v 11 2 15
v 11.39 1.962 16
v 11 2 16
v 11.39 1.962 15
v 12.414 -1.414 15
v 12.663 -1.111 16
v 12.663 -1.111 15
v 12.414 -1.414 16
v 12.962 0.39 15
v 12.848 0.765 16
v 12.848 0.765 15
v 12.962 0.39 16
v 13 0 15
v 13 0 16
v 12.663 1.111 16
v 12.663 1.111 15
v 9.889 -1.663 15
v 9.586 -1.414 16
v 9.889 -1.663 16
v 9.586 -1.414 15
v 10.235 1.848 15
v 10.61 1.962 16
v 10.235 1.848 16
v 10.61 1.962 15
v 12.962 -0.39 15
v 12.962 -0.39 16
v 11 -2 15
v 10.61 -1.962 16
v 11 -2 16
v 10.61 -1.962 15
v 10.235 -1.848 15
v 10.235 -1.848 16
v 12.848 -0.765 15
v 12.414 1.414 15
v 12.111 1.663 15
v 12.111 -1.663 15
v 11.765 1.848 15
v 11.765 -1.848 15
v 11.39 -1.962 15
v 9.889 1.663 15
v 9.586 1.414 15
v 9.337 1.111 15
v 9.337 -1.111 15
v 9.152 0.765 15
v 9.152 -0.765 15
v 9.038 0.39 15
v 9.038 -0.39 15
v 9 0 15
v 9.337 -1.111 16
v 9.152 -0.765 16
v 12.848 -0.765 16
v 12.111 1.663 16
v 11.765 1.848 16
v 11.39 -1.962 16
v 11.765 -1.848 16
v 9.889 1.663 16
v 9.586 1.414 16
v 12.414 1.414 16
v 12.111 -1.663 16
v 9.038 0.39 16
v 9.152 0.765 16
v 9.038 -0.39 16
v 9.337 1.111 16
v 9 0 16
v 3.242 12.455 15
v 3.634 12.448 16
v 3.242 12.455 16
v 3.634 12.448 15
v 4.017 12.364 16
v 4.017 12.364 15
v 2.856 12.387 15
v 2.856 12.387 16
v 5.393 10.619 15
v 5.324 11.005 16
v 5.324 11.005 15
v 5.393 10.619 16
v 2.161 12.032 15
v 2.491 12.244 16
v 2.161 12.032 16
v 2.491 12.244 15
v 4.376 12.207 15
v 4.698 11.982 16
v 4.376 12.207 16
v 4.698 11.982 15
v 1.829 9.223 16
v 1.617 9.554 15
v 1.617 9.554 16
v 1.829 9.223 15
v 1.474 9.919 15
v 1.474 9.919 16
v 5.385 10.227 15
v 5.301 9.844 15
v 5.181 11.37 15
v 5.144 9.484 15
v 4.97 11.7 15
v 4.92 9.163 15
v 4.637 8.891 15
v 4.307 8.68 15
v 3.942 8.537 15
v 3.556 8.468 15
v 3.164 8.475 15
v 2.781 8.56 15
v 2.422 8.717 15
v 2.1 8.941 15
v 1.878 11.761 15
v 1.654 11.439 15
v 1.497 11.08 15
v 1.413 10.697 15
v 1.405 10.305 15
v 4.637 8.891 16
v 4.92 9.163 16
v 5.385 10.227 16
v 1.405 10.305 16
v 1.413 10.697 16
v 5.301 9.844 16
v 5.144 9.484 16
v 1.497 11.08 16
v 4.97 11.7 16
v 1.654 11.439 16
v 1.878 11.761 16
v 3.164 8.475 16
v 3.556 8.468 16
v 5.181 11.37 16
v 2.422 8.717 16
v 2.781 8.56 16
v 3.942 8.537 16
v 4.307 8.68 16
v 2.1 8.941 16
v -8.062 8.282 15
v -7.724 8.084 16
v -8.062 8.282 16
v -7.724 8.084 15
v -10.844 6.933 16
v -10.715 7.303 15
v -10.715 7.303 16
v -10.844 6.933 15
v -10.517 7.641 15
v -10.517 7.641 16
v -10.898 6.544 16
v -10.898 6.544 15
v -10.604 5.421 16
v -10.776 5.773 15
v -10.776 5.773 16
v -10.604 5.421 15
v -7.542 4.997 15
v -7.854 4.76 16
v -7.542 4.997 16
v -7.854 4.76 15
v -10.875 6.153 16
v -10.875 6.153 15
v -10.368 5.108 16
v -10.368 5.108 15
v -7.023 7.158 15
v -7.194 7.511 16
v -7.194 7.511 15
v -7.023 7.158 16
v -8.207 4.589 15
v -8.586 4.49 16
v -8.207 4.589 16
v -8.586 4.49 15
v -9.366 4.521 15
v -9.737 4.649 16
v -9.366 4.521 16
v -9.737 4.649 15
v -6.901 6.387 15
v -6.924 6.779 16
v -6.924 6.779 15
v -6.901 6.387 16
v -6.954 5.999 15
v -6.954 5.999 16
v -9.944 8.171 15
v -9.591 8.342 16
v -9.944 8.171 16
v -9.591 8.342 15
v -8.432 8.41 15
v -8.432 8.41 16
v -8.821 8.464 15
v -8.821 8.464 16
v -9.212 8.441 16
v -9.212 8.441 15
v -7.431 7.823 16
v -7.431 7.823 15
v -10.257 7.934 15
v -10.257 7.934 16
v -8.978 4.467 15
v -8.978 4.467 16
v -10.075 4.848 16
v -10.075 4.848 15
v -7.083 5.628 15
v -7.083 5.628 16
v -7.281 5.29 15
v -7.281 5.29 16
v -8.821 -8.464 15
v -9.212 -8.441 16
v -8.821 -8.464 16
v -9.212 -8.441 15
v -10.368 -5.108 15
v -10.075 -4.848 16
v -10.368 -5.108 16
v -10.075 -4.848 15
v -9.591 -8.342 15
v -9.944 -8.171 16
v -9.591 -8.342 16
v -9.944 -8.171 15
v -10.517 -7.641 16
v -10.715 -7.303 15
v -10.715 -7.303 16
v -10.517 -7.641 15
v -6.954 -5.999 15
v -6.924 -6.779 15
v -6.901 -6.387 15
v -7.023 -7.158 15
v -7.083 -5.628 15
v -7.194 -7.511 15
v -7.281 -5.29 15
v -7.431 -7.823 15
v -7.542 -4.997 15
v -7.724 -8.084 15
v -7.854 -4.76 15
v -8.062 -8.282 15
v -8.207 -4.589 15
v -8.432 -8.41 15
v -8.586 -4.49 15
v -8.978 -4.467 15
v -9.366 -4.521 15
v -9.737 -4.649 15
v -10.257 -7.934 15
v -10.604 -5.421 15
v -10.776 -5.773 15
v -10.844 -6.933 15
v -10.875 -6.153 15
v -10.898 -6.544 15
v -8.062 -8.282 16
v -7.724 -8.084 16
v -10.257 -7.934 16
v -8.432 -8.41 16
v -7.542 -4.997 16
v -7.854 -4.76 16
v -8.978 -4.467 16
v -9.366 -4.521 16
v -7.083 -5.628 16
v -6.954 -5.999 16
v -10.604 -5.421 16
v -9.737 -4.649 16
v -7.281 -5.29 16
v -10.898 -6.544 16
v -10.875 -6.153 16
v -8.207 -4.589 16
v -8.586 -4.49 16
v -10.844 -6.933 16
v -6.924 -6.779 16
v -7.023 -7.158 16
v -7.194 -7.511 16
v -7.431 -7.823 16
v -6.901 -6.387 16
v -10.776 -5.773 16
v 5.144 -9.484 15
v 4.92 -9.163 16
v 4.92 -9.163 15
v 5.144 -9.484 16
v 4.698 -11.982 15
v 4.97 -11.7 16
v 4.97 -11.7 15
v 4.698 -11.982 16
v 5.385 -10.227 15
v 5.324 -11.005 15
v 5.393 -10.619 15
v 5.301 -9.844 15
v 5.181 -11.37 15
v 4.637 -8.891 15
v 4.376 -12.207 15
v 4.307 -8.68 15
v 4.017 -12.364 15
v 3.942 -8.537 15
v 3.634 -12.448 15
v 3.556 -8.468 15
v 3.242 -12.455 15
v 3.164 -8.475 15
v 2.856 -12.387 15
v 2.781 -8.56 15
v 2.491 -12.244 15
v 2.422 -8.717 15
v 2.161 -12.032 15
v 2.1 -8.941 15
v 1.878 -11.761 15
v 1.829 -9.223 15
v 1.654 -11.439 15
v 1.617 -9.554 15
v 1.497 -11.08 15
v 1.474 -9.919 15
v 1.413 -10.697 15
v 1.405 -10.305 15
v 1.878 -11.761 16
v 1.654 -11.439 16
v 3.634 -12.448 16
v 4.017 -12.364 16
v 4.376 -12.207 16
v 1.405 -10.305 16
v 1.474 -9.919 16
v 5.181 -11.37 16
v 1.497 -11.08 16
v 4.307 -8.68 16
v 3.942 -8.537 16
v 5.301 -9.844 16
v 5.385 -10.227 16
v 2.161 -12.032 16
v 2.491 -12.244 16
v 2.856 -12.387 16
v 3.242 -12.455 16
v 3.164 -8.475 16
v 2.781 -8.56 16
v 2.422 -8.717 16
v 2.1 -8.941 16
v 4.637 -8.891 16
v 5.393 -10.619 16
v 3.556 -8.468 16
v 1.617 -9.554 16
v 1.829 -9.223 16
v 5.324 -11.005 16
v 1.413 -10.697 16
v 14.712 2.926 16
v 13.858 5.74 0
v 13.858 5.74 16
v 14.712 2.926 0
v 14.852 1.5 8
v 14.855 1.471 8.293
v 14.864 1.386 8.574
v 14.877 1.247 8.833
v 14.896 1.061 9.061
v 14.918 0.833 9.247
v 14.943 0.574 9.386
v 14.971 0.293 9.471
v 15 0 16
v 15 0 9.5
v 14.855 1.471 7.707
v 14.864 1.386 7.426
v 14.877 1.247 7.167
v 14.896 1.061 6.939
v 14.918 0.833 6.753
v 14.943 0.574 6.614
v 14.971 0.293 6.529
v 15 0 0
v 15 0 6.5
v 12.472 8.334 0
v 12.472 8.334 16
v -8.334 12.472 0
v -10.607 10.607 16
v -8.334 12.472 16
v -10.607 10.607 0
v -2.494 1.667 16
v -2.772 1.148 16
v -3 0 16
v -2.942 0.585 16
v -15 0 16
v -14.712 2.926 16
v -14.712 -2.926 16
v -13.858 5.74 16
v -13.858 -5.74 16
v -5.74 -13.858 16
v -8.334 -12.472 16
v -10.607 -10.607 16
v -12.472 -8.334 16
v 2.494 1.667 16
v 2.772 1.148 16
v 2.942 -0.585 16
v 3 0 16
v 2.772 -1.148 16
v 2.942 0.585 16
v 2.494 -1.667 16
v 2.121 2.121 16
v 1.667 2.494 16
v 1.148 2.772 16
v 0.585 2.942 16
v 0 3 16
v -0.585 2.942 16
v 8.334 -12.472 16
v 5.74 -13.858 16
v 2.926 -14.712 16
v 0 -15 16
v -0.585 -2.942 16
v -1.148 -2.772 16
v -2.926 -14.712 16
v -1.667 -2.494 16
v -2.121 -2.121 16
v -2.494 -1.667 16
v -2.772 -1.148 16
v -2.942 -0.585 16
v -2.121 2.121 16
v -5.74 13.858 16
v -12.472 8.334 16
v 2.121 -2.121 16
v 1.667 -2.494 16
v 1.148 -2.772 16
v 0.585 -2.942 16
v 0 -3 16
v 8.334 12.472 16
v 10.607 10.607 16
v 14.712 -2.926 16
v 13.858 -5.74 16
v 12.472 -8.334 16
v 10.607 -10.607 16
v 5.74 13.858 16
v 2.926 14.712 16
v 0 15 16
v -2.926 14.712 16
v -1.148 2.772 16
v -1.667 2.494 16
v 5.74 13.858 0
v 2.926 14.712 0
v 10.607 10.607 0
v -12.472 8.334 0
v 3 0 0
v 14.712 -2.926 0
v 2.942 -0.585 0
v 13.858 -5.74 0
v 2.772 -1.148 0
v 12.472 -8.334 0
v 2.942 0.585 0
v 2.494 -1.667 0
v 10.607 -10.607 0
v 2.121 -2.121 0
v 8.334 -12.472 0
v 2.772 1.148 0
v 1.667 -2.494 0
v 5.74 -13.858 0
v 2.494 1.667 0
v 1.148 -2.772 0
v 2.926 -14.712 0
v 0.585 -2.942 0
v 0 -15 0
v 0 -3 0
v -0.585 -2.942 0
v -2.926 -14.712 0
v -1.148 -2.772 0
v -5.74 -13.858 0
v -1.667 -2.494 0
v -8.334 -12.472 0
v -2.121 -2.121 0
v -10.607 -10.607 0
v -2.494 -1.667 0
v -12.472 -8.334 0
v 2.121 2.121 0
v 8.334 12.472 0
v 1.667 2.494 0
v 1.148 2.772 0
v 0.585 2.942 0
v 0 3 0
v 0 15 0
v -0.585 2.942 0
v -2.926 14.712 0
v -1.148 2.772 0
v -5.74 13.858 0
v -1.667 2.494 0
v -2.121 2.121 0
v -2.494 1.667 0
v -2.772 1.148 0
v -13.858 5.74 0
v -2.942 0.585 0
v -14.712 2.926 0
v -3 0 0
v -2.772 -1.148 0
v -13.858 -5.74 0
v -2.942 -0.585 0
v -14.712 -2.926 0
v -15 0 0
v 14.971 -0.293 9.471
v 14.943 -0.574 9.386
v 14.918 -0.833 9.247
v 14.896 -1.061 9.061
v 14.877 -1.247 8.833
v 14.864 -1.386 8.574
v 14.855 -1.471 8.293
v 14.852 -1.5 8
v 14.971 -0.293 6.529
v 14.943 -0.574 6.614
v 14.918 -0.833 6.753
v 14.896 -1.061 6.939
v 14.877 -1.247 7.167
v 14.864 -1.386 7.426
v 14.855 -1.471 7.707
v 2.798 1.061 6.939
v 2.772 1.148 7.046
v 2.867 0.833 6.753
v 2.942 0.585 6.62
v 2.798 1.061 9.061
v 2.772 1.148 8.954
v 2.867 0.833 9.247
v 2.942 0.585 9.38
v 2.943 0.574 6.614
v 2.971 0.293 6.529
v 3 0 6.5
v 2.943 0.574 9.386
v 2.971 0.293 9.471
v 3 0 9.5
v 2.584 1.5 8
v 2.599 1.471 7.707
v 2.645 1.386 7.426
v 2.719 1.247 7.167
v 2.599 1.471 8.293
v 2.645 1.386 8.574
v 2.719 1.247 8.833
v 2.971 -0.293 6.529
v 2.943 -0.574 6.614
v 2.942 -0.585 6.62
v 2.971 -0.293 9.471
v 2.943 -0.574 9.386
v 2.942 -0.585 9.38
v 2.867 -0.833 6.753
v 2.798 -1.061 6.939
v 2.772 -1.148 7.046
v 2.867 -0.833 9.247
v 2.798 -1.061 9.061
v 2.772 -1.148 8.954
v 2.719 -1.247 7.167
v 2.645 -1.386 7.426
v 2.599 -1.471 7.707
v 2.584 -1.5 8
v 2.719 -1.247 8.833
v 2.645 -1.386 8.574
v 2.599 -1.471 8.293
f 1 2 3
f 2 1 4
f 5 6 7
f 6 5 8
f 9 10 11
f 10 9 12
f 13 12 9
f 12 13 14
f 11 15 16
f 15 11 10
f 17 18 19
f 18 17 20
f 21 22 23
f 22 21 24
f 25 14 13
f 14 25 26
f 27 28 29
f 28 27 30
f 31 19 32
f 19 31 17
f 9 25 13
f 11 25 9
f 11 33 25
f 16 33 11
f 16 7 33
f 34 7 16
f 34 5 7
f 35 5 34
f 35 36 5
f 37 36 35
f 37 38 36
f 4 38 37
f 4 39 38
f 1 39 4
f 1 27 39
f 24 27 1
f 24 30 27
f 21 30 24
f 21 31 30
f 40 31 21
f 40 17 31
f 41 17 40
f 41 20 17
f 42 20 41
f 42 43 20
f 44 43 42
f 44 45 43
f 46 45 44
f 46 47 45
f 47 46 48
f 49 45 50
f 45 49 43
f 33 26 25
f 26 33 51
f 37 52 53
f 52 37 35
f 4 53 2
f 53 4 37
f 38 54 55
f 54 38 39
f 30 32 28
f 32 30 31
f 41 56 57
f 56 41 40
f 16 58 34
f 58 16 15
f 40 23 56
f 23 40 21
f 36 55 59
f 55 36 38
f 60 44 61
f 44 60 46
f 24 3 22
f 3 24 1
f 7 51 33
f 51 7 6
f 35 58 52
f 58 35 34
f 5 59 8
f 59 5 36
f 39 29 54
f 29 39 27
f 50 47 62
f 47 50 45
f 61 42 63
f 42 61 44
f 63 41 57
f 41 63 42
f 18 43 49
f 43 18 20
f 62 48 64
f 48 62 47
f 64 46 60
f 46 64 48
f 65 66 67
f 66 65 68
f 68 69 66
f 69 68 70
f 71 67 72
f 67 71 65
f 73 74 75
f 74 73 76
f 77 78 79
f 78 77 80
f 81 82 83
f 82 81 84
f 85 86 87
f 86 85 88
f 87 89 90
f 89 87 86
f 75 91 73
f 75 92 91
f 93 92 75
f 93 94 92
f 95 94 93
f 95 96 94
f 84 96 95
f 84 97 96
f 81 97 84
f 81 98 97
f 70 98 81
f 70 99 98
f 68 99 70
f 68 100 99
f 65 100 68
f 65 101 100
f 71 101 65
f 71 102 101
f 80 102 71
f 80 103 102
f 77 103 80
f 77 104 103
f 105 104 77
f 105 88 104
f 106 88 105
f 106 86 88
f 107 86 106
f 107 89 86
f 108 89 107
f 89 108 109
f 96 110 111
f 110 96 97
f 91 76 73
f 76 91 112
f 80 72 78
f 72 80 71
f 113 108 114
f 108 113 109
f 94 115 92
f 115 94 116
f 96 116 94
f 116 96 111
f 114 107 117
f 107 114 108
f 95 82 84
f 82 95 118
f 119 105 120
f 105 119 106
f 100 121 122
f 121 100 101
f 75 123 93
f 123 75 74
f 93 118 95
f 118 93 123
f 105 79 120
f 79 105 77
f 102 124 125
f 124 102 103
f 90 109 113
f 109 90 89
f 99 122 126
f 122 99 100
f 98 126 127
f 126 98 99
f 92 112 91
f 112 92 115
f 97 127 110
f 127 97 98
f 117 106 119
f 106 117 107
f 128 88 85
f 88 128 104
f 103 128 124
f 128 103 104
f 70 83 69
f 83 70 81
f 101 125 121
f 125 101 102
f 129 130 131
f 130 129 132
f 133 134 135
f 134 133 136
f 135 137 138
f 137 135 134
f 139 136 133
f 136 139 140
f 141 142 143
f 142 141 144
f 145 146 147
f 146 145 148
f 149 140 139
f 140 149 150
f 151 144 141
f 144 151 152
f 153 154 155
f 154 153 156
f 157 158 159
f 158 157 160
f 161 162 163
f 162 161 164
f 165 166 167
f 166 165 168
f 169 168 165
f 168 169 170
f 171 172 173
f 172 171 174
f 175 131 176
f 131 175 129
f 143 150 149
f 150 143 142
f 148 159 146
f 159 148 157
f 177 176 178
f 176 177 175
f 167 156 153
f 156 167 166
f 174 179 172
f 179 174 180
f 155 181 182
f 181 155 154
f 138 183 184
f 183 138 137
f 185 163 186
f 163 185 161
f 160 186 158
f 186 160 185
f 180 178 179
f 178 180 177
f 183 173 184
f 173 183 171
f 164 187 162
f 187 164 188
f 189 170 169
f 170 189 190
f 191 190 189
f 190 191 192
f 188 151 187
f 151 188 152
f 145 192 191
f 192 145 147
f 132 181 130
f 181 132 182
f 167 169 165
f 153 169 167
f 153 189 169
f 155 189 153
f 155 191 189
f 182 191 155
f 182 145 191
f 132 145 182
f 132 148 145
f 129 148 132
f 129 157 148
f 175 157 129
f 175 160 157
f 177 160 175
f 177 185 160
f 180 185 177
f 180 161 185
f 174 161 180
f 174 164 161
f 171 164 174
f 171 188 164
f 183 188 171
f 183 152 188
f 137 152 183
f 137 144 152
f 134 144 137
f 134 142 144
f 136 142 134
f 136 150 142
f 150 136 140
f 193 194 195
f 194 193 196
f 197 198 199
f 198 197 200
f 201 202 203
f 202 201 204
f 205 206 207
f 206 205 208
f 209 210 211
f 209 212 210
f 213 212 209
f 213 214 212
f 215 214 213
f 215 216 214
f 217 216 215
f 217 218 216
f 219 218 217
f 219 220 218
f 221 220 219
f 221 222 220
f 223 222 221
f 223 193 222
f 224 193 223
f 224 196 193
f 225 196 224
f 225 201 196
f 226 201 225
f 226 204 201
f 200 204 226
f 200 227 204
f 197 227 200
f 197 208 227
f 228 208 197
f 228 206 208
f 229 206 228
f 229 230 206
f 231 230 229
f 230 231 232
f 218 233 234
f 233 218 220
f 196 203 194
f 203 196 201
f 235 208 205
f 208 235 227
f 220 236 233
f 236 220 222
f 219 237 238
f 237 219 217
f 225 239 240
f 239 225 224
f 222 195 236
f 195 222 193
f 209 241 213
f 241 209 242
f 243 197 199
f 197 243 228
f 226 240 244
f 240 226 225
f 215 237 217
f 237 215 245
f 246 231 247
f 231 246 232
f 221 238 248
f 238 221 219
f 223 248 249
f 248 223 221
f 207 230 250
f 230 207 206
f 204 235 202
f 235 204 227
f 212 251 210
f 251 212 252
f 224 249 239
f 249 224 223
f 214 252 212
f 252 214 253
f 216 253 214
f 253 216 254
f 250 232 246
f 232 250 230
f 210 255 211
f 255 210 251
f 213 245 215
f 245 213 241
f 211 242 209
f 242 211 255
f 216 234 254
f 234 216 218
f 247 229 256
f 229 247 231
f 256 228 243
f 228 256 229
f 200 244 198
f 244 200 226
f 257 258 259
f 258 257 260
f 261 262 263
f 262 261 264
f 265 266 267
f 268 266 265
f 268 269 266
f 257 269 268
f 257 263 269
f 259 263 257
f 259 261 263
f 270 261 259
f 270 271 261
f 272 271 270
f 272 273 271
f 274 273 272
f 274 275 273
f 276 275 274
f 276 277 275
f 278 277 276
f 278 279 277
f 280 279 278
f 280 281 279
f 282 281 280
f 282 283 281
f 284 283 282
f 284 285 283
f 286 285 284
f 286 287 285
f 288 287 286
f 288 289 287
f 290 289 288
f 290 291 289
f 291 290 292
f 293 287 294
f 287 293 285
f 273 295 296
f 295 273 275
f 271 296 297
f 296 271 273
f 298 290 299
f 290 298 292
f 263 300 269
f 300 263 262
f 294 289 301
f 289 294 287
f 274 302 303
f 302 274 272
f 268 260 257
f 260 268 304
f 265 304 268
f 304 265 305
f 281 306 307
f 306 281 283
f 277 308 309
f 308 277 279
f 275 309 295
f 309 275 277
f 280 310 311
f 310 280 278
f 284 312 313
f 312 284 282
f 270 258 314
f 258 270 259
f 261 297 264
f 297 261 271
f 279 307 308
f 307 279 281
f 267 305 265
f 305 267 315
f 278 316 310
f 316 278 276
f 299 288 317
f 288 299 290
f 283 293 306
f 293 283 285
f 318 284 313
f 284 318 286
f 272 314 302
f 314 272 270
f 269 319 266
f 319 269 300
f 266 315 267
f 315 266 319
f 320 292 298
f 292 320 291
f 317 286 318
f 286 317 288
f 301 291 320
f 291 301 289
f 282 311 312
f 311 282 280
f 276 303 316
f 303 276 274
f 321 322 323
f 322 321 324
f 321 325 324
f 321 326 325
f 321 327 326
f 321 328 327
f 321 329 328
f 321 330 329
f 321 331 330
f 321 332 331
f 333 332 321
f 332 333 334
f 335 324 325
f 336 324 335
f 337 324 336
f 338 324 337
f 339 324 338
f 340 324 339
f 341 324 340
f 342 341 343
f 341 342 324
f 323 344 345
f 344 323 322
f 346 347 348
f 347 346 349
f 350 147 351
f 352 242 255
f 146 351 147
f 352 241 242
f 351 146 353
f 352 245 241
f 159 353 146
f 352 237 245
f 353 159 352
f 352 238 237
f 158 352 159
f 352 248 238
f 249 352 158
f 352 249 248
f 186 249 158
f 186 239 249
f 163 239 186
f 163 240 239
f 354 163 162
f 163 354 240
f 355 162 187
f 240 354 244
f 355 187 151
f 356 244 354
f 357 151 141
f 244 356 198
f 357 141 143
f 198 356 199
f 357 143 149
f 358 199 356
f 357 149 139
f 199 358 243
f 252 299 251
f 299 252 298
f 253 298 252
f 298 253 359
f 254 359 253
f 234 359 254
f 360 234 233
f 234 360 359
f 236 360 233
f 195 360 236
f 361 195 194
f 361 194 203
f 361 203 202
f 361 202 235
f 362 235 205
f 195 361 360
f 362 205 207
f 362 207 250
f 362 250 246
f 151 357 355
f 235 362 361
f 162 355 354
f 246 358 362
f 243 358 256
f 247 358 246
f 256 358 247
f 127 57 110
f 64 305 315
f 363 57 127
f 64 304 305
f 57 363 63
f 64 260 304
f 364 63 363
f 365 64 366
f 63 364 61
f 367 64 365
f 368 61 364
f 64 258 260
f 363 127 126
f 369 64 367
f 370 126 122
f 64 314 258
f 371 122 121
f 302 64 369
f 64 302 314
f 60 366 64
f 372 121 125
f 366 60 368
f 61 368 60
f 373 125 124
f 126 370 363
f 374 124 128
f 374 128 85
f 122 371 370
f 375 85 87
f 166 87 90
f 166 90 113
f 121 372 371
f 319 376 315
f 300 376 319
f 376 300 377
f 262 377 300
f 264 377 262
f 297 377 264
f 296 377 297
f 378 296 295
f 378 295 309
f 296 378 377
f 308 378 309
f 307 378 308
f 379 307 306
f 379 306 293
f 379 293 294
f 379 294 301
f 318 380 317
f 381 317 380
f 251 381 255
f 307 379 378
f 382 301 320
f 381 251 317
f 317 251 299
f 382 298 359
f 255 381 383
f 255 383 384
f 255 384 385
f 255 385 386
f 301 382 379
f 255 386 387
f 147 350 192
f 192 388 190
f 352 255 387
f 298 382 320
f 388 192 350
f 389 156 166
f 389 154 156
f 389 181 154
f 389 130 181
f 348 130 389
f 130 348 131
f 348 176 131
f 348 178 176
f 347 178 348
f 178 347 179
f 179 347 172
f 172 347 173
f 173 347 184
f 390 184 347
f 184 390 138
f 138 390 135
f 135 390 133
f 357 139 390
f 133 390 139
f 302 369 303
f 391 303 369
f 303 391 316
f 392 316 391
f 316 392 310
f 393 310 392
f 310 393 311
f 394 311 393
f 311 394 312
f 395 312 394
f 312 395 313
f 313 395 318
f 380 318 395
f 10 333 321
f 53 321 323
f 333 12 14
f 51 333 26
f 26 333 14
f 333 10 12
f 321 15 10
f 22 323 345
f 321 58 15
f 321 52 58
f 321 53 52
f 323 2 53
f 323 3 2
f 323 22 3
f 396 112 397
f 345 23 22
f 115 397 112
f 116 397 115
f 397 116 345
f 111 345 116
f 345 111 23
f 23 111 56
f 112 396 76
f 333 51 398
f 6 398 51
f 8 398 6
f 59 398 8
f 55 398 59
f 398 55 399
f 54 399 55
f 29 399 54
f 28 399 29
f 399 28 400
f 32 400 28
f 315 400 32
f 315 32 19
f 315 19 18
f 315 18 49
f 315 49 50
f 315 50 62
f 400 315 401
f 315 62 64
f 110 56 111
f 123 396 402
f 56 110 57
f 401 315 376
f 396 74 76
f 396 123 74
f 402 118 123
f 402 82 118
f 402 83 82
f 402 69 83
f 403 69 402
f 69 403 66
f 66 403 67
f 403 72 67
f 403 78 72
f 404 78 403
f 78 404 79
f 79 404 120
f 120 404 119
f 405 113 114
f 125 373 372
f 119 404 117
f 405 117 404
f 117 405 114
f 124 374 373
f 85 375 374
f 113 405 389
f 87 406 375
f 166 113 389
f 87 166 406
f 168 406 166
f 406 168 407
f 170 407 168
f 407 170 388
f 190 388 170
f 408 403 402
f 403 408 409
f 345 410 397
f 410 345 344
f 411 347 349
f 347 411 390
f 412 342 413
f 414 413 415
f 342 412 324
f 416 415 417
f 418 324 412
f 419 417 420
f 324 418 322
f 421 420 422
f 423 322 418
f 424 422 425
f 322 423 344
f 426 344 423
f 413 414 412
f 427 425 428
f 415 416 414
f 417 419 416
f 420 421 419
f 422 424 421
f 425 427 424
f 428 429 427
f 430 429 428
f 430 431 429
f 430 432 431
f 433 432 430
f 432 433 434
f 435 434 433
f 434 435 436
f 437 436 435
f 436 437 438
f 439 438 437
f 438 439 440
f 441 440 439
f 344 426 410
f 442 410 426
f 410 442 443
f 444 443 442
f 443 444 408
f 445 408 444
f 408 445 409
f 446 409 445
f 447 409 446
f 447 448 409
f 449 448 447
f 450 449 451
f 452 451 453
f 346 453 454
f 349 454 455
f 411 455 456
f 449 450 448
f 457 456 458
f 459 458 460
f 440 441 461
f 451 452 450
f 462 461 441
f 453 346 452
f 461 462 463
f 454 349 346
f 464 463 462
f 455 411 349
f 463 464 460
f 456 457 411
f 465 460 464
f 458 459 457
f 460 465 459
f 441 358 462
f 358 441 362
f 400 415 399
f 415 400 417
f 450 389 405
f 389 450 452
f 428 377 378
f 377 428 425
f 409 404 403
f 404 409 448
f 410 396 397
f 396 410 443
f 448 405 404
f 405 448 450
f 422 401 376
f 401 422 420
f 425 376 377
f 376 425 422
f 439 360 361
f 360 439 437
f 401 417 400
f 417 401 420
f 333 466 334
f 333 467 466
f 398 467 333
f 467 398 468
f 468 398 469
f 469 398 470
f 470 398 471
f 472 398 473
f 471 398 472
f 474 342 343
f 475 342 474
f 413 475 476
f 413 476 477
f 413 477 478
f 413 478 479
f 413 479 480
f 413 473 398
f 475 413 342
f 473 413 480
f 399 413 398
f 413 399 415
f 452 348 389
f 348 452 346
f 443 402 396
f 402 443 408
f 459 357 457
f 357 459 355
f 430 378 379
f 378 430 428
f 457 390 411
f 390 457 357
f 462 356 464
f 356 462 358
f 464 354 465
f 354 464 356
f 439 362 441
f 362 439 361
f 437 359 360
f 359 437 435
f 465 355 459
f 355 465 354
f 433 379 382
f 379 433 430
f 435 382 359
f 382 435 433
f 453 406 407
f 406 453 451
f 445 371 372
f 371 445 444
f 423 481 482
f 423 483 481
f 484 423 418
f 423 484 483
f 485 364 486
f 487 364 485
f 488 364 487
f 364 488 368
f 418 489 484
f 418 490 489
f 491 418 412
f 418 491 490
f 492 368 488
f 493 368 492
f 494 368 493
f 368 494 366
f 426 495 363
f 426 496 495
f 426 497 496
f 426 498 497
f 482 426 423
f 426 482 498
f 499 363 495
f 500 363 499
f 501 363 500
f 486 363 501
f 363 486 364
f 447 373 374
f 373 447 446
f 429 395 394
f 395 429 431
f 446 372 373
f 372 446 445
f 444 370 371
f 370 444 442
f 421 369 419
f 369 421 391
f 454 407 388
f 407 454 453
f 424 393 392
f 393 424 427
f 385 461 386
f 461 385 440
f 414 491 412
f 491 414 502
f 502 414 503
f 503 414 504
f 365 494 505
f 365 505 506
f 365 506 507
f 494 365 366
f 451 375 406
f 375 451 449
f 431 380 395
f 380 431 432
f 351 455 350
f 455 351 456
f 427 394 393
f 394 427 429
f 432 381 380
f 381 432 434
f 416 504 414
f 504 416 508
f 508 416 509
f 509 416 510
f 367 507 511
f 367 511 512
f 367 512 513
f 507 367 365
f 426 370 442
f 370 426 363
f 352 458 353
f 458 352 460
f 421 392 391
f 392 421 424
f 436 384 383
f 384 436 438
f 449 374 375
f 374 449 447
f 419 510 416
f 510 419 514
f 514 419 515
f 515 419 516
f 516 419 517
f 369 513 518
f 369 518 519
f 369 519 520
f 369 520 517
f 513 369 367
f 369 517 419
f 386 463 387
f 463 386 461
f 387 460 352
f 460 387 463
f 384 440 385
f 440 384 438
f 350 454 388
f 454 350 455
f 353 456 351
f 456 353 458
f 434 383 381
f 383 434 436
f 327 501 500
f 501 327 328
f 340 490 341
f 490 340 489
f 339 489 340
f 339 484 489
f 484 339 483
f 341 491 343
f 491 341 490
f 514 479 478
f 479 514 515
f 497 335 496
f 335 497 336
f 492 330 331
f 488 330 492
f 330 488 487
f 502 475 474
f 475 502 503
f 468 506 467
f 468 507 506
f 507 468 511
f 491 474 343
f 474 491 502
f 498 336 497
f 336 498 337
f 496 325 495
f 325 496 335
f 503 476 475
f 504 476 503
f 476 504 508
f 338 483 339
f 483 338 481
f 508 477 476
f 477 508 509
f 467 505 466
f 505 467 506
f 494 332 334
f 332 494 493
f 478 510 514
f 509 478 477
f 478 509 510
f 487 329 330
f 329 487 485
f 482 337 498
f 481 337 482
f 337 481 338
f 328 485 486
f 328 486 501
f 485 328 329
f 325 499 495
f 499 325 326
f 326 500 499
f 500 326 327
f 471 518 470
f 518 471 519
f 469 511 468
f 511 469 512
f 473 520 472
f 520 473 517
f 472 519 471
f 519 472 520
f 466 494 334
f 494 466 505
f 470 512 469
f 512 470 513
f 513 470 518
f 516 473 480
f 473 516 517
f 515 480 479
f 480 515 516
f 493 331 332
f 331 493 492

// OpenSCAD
$fn = 32;

// ----------------------------------------------------------------------
// Control knob: dimpled knob
// ----------------------------------------------------------------------

// --- parameters (mm) ---
dimp_d = 4;               // finger dimple diameter
n_dimp = 5;               // number of dimples
dimp_r = 11;              // dimple ring radius
knob_d = 30;              // knob body diameter
knob_h = 16;              // knob body height
bore_d = 6;               // shaft bore diameter
set_d = 3;                // set screw bore diameter

dimp_step = 360 / n_dimp;  // dimple angular step

difference() {
  cylinder(h = knob_h, d = knob_d);
  translate([0, 0, -1]) cylinder(h = knob_h + 2, d = bore_d);
  translate([-1, 0, knob_h / 2]) rotate([0, 90, 0])
    cylinder(h = knob_d / 2 + bore_d / 2 + 2, d = set_d);  for (i = [0 : n_dimp - 1])
    rotate([0, 0, i * dimp_step])
      translate([dimp_r, 0, knob_h - 1])
        cylinder(h = 2, d = dimp_d);
}
